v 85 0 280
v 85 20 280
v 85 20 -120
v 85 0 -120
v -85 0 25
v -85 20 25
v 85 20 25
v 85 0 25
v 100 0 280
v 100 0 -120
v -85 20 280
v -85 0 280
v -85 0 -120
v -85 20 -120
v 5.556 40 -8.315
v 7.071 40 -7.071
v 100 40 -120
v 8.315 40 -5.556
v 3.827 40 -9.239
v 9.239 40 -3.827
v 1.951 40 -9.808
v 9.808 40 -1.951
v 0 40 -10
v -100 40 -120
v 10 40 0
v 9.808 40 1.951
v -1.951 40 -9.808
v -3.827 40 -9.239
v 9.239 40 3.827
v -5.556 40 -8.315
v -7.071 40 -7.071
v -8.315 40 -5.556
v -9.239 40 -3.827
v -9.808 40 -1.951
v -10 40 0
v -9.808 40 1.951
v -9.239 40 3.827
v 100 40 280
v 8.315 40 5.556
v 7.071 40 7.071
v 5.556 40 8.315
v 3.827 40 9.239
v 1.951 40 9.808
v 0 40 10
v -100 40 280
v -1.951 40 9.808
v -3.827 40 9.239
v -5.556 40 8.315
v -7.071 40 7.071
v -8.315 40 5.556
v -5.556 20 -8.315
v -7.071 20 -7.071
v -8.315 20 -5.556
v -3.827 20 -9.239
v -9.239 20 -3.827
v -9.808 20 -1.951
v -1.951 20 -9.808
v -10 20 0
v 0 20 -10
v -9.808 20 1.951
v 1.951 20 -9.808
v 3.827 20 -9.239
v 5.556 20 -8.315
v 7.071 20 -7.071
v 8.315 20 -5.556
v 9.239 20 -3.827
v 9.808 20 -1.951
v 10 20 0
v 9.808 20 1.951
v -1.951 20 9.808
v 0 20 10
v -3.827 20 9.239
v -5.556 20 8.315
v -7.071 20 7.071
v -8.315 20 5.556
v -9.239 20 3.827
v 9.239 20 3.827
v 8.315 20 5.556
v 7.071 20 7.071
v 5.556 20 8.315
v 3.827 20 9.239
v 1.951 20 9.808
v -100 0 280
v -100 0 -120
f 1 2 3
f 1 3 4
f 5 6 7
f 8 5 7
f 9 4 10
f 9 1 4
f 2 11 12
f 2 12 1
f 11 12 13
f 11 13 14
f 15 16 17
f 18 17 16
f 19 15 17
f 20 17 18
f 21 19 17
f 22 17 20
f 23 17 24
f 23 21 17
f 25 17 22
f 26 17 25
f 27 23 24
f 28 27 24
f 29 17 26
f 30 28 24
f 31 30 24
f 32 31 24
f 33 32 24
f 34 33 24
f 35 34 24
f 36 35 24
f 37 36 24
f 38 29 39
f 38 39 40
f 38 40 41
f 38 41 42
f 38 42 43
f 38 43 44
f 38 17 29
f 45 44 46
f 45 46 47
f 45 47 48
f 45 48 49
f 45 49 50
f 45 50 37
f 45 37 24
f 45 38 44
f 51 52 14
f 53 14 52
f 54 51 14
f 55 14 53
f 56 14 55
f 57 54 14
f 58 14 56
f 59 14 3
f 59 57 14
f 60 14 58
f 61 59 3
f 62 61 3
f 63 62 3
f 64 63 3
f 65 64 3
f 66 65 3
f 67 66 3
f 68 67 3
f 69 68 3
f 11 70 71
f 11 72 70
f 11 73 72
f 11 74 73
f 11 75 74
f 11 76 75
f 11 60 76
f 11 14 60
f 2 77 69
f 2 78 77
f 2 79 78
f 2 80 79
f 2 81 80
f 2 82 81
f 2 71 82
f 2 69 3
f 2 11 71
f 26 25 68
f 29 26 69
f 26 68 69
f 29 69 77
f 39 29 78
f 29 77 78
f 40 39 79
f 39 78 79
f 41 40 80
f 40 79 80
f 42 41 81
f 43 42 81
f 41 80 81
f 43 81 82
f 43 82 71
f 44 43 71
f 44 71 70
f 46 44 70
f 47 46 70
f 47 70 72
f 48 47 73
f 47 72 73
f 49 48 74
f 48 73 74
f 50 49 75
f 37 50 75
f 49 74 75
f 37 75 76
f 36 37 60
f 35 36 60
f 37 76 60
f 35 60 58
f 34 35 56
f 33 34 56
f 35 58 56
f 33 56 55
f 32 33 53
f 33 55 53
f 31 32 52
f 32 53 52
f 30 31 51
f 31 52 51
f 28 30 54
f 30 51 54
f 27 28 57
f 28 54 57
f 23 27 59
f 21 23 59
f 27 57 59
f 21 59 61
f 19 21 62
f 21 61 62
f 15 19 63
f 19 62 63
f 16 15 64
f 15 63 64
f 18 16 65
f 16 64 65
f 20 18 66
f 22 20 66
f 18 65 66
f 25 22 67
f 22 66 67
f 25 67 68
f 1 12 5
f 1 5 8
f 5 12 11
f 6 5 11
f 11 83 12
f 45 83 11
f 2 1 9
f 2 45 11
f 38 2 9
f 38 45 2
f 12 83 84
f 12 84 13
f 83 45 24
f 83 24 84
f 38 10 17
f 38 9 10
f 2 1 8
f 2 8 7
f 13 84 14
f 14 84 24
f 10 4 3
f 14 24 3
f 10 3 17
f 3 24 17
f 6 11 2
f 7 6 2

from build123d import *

# Parameters (mm, degrees)
F1_DEPTH      = 280
F1_DEPTH_BACK = 120
F2_R          = 10
F3_DEPTH      = 20
F4_W          = 170
F4_H          = 20
F5_DEPTH      = 255


with BuildPart() as f1:
    # F0 (on Top) → F1 (new body, two sides)
    with BuildSketch(Plane.XY) as f1_sk:
        Polygon((100, 40), (0, 40), (-100, 40), (-100, 0), (-85, 0), (-85, 20), (0, 20), (85, 20), (85, 0), (100, 0), align=None)
    extrude(amount=F1_DEPTH)
    extrude(f1_sk.sketch, amount=-F1_DEPTH_BACK)

    # F2 (on face) → F3 (cut)
    with BuildSketch(Plane.XZ.offset(-20)):
        Circle(F2_R)
    extrude(amount=-F3_DEPTH, mode=Mode.SUBTRACT)


with BuildPart() as f5:
    # F4 (on face) → F5 (new body)
    with BuildSketch(Plane.XY.offset(280)):
        with Locations((0, 10)):
            Rectangle(F4_W, F4_H)
    extrude(amount=-F5_DEPTH)


solid = Compound([f1.part, f5.part])
